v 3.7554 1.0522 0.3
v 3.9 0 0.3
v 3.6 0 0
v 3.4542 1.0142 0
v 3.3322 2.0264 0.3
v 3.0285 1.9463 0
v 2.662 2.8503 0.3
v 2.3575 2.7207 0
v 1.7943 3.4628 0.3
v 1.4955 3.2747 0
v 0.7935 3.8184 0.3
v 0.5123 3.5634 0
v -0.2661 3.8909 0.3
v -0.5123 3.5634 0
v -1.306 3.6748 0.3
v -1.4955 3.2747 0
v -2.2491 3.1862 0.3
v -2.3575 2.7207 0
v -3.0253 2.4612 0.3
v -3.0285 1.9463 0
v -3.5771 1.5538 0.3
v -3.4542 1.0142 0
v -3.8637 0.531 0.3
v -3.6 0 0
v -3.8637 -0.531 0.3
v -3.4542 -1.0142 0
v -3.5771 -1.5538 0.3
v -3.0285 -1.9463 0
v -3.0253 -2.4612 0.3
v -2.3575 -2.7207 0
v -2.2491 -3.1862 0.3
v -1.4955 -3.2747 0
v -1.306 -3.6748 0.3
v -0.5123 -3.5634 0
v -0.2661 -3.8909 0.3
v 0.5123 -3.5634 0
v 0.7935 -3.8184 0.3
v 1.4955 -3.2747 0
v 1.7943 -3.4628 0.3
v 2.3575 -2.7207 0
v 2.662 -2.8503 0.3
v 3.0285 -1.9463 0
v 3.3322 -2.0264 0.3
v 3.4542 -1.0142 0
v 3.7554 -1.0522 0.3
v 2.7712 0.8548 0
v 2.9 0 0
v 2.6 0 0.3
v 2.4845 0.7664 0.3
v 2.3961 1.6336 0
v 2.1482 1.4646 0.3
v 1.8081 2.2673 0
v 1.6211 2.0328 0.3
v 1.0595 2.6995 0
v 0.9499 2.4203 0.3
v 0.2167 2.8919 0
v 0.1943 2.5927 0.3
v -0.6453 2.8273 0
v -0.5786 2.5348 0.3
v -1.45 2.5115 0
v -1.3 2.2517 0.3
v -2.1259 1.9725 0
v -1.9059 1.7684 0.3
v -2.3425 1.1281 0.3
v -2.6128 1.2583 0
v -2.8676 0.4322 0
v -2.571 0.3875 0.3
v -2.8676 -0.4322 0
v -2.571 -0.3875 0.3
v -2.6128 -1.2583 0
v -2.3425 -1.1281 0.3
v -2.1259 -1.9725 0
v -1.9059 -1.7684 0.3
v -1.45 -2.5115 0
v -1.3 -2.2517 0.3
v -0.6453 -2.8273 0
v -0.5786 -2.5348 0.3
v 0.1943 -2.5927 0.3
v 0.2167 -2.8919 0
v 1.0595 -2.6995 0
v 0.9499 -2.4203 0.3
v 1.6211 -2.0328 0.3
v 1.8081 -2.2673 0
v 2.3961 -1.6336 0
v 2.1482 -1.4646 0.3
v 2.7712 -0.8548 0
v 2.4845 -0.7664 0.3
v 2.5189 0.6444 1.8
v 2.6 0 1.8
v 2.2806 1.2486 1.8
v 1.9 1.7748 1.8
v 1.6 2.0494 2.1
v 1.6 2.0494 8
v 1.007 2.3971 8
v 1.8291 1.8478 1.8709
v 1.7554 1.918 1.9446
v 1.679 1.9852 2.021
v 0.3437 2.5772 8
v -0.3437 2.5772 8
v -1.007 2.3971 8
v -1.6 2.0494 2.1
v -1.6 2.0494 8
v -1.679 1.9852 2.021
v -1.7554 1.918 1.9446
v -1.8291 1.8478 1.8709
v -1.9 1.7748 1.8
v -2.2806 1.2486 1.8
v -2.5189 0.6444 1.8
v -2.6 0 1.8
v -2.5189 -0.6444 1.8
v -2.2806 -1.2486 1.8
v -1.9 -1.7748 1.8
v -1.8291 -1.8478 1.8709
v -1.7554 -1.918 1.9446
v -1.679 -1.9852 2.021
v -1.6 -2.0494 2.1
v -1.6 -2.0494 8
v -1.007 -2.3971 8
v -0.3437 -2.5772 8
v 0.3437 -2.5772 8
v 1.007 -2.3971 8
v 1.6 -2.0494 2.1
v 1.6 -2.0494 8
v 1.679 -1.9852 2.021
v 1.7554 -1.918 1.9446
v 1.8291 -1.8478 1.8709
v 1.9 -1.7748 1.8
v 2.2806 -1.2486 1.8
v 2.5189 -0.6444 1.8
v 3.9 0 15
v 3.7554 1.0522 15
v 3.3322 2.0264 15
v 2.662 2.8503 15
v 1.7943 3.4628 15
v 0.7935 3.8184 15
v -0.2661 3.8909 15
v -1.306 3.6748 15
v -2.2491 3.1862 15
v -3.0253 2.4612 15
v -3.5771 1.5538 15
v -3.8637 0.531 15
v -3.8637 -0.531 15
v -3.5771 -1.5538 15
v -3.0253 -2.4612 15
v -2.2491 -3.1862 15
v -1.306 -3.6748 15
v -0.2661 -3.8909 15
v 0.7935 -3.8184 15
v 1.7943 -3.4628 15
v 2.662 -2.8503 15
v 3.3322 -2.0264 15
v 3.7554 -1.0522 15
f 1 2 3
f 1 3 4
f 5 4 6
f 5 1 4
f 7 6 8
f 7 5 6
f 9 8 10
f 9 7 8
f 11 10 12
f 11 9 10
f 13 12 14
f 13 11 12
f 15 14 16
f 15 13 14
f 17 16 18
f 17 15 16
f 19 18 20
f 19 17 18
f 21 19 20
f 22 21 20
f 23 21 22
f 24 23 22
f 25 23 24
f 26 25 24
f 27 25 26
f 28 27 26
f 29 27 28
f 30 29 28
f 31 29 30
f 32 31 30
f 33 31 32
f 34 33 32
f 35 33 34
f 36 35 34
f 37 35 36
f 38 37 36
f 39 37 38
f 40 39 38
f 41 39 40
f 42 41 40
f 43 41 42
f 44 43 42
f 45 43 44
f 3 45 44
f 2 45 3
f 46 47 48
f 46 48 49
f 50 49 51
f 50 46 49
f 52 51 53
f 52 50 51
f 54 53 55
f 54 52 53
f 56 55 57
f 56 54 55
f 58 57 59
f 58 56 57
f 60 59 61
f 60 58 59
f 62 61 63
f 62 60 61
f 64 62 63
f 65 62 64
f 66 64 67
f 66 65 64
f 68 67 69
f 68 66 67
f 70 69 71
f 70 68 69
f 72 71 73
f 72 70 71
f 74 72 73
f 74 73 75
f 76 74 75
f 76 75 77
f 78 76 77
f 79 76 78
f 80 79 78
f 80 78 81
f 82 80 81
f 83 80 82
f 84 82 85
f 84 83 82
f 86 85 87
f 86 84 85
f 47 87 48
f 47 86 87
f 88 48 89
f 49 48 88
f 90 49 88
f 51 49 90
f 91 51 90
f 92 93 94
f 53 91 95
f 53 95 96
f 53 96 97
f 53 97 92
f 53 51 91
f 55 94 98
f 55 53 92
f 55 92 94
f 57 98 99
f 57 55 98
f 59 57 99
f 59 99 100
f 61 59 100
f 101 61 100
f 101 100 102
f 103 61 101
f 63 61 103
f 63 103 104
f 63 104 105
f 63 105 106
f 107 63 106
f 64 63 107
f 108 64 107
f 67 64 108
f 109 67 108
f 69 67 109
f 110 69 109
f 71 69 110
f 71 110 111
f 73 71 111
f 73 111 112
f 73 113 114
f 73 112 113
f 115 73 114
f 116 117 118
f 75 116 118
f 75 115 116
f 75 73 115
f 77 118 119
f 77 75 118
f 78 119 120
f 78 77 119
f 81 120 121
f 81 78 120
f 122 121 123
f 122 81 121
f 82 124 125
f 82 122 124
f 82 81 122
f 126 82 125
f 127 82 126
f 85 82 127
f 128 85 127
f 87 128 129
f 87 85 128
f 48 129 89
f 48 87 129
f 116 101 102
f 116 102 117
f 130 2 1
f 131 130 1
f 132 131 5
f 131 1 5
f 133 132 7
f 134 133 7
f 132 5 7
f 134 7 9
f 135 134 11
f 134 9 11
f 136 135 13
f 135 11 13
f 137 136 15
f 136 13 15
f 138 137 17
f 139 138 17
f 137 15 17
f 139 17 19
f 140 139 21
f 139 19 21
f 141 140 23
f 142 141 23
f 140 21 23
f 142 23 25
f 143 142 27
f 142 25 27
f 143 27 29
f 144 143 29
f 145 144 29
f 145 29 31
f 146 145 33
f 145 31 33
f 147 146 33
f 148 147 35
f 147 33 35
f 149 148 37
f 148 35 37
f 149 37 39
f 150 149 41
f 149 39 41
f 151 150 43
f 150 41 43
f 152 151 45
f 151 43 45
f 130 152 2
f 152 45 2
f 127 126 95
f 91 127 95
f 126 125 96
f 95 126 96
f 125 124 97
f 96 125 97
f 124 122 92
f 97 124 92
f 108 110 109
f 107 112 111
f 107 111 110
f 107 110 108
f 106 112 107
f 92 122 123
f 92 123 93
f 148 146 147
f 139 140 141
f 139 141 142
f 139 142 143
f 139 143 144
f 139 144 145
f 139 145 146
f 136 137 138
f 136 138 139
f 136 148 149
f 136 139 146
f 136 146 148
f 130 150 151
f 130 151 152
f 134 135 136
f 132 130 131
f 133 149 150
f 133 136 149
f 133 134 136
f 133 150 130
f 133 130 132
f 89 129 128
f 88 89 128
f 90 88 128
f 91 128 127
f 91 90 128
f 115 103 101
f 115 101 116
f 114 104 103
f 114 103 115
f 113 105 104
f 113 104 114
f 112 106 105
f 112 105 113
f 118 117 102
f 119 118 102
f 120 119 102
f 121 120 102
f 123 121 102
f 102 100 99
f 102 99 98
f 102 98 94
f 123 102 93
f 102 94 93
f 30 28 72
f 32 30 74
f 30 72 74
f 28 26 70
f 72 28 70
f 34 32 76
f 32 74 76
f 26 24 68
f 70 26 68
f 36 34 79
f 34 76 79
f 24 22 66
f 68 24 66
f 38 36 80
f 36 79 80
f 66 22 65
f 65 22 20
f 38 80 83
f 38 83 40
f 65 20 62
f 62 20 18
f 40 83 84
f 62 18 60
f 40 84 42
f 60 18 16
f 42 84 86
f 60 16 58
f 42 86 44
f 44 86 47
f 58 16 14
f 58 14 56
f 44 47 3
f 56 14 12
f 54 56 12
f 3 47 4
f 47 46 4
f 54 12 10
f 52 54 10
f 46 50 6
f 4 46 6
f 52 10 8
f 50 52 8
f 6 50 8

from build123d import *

# Parameters (mm, degrees)
SKETCH_1_R      = 3.9
SKETCH_1_R_2    = 2.6
EXTRUDE_1_DEPTH = 15
EXTRUDE_START   = -7
SKETCH_2_R      = 2.6
EXTRUDE_2_DEPTH = 7
EXTRUDE_START_2 = 6.2
EXTRUDE_3_DEPTH = 6.2
CHAMFER_1_SIZE  = 0.3
CHAMFER_2_SIZE  = 0.3
CHAMFER_3_SIZE  = 0.3


with BuildPart() as part:
    # 草图1 → 凸台-拉伸1 (new body)
    with BuildSketch(Plane.XY):
        Circle(SKETCH_1_R)
        Circle(SKETCH_1_R_2, mode=Mode.SUBTRACT)
    extrude(amount=EXTRUDE_1_DEPTH)

    # 草图2 → 凸台-拉伸2 (add)
    with BuildSketch(Plane.XY.offset(15).offset(EXTRUDE_START)):
        Circle(SKETCH_2_R)
    extrude(amount=EXTRUDE_2_DEPTH)

    # 草图3 → 凸台-拉伸3 (add)
    with BuildSketch(Plane(origin=(0, 0, 8), x_dir=(-1, 0, 0), z_dir=(0, 0, -1)).offset(EXTRUDE_START_2)):
        with BuildLine():
            Line((-1.6, -2.049390153), (-1.6, 2.049390153))
            ThreePointArc((-1.6, 2.049390153), (-2.6, 0), (-1.6, -2.049390153))
        make_face()
        with BuildLine():
            ThreePointArc((2.6, 0), (2.336664289, 1.140175425), (1.6, 2.049390153))
            Line((1.6, 2.049390153), (1.6, -2.049390153))
            ThreePointArc((1.6, -2.049390153), (2.336664289, -1.140175425), (2.6, 0))
        make_face()
    extrude(amount=-EXTRUDE_3_DEPTH)

    # 倒角1
    chamfer_1_edges = [part.edges().sort_by_distance(p)[0] for p in [
        (-2.6, 0, 0),
    ]]
    chamfer(chamfer_1_edges, length=CHAMFER_1_SIZE)

    # 倒角2
    chamfer_2_edges = [part.edges().sort_by_distance(p)[0] for p in [
        (-3.9, 0, 0),
    ]]
    chamfer(chamfer_2_edges, length=CHAMFER_2_SIZE)

    # 倒角3
    chamfer_3_edges = [part.edges().sort_by_distance(p)[0] for p in [
        (1.6, 0, 1.8),
        (-1.6, 0, 1.8),
    ]]
    chamfer(chamfer_3_edges, length=CHAMFER_3_SIZE)


solid = part.part
